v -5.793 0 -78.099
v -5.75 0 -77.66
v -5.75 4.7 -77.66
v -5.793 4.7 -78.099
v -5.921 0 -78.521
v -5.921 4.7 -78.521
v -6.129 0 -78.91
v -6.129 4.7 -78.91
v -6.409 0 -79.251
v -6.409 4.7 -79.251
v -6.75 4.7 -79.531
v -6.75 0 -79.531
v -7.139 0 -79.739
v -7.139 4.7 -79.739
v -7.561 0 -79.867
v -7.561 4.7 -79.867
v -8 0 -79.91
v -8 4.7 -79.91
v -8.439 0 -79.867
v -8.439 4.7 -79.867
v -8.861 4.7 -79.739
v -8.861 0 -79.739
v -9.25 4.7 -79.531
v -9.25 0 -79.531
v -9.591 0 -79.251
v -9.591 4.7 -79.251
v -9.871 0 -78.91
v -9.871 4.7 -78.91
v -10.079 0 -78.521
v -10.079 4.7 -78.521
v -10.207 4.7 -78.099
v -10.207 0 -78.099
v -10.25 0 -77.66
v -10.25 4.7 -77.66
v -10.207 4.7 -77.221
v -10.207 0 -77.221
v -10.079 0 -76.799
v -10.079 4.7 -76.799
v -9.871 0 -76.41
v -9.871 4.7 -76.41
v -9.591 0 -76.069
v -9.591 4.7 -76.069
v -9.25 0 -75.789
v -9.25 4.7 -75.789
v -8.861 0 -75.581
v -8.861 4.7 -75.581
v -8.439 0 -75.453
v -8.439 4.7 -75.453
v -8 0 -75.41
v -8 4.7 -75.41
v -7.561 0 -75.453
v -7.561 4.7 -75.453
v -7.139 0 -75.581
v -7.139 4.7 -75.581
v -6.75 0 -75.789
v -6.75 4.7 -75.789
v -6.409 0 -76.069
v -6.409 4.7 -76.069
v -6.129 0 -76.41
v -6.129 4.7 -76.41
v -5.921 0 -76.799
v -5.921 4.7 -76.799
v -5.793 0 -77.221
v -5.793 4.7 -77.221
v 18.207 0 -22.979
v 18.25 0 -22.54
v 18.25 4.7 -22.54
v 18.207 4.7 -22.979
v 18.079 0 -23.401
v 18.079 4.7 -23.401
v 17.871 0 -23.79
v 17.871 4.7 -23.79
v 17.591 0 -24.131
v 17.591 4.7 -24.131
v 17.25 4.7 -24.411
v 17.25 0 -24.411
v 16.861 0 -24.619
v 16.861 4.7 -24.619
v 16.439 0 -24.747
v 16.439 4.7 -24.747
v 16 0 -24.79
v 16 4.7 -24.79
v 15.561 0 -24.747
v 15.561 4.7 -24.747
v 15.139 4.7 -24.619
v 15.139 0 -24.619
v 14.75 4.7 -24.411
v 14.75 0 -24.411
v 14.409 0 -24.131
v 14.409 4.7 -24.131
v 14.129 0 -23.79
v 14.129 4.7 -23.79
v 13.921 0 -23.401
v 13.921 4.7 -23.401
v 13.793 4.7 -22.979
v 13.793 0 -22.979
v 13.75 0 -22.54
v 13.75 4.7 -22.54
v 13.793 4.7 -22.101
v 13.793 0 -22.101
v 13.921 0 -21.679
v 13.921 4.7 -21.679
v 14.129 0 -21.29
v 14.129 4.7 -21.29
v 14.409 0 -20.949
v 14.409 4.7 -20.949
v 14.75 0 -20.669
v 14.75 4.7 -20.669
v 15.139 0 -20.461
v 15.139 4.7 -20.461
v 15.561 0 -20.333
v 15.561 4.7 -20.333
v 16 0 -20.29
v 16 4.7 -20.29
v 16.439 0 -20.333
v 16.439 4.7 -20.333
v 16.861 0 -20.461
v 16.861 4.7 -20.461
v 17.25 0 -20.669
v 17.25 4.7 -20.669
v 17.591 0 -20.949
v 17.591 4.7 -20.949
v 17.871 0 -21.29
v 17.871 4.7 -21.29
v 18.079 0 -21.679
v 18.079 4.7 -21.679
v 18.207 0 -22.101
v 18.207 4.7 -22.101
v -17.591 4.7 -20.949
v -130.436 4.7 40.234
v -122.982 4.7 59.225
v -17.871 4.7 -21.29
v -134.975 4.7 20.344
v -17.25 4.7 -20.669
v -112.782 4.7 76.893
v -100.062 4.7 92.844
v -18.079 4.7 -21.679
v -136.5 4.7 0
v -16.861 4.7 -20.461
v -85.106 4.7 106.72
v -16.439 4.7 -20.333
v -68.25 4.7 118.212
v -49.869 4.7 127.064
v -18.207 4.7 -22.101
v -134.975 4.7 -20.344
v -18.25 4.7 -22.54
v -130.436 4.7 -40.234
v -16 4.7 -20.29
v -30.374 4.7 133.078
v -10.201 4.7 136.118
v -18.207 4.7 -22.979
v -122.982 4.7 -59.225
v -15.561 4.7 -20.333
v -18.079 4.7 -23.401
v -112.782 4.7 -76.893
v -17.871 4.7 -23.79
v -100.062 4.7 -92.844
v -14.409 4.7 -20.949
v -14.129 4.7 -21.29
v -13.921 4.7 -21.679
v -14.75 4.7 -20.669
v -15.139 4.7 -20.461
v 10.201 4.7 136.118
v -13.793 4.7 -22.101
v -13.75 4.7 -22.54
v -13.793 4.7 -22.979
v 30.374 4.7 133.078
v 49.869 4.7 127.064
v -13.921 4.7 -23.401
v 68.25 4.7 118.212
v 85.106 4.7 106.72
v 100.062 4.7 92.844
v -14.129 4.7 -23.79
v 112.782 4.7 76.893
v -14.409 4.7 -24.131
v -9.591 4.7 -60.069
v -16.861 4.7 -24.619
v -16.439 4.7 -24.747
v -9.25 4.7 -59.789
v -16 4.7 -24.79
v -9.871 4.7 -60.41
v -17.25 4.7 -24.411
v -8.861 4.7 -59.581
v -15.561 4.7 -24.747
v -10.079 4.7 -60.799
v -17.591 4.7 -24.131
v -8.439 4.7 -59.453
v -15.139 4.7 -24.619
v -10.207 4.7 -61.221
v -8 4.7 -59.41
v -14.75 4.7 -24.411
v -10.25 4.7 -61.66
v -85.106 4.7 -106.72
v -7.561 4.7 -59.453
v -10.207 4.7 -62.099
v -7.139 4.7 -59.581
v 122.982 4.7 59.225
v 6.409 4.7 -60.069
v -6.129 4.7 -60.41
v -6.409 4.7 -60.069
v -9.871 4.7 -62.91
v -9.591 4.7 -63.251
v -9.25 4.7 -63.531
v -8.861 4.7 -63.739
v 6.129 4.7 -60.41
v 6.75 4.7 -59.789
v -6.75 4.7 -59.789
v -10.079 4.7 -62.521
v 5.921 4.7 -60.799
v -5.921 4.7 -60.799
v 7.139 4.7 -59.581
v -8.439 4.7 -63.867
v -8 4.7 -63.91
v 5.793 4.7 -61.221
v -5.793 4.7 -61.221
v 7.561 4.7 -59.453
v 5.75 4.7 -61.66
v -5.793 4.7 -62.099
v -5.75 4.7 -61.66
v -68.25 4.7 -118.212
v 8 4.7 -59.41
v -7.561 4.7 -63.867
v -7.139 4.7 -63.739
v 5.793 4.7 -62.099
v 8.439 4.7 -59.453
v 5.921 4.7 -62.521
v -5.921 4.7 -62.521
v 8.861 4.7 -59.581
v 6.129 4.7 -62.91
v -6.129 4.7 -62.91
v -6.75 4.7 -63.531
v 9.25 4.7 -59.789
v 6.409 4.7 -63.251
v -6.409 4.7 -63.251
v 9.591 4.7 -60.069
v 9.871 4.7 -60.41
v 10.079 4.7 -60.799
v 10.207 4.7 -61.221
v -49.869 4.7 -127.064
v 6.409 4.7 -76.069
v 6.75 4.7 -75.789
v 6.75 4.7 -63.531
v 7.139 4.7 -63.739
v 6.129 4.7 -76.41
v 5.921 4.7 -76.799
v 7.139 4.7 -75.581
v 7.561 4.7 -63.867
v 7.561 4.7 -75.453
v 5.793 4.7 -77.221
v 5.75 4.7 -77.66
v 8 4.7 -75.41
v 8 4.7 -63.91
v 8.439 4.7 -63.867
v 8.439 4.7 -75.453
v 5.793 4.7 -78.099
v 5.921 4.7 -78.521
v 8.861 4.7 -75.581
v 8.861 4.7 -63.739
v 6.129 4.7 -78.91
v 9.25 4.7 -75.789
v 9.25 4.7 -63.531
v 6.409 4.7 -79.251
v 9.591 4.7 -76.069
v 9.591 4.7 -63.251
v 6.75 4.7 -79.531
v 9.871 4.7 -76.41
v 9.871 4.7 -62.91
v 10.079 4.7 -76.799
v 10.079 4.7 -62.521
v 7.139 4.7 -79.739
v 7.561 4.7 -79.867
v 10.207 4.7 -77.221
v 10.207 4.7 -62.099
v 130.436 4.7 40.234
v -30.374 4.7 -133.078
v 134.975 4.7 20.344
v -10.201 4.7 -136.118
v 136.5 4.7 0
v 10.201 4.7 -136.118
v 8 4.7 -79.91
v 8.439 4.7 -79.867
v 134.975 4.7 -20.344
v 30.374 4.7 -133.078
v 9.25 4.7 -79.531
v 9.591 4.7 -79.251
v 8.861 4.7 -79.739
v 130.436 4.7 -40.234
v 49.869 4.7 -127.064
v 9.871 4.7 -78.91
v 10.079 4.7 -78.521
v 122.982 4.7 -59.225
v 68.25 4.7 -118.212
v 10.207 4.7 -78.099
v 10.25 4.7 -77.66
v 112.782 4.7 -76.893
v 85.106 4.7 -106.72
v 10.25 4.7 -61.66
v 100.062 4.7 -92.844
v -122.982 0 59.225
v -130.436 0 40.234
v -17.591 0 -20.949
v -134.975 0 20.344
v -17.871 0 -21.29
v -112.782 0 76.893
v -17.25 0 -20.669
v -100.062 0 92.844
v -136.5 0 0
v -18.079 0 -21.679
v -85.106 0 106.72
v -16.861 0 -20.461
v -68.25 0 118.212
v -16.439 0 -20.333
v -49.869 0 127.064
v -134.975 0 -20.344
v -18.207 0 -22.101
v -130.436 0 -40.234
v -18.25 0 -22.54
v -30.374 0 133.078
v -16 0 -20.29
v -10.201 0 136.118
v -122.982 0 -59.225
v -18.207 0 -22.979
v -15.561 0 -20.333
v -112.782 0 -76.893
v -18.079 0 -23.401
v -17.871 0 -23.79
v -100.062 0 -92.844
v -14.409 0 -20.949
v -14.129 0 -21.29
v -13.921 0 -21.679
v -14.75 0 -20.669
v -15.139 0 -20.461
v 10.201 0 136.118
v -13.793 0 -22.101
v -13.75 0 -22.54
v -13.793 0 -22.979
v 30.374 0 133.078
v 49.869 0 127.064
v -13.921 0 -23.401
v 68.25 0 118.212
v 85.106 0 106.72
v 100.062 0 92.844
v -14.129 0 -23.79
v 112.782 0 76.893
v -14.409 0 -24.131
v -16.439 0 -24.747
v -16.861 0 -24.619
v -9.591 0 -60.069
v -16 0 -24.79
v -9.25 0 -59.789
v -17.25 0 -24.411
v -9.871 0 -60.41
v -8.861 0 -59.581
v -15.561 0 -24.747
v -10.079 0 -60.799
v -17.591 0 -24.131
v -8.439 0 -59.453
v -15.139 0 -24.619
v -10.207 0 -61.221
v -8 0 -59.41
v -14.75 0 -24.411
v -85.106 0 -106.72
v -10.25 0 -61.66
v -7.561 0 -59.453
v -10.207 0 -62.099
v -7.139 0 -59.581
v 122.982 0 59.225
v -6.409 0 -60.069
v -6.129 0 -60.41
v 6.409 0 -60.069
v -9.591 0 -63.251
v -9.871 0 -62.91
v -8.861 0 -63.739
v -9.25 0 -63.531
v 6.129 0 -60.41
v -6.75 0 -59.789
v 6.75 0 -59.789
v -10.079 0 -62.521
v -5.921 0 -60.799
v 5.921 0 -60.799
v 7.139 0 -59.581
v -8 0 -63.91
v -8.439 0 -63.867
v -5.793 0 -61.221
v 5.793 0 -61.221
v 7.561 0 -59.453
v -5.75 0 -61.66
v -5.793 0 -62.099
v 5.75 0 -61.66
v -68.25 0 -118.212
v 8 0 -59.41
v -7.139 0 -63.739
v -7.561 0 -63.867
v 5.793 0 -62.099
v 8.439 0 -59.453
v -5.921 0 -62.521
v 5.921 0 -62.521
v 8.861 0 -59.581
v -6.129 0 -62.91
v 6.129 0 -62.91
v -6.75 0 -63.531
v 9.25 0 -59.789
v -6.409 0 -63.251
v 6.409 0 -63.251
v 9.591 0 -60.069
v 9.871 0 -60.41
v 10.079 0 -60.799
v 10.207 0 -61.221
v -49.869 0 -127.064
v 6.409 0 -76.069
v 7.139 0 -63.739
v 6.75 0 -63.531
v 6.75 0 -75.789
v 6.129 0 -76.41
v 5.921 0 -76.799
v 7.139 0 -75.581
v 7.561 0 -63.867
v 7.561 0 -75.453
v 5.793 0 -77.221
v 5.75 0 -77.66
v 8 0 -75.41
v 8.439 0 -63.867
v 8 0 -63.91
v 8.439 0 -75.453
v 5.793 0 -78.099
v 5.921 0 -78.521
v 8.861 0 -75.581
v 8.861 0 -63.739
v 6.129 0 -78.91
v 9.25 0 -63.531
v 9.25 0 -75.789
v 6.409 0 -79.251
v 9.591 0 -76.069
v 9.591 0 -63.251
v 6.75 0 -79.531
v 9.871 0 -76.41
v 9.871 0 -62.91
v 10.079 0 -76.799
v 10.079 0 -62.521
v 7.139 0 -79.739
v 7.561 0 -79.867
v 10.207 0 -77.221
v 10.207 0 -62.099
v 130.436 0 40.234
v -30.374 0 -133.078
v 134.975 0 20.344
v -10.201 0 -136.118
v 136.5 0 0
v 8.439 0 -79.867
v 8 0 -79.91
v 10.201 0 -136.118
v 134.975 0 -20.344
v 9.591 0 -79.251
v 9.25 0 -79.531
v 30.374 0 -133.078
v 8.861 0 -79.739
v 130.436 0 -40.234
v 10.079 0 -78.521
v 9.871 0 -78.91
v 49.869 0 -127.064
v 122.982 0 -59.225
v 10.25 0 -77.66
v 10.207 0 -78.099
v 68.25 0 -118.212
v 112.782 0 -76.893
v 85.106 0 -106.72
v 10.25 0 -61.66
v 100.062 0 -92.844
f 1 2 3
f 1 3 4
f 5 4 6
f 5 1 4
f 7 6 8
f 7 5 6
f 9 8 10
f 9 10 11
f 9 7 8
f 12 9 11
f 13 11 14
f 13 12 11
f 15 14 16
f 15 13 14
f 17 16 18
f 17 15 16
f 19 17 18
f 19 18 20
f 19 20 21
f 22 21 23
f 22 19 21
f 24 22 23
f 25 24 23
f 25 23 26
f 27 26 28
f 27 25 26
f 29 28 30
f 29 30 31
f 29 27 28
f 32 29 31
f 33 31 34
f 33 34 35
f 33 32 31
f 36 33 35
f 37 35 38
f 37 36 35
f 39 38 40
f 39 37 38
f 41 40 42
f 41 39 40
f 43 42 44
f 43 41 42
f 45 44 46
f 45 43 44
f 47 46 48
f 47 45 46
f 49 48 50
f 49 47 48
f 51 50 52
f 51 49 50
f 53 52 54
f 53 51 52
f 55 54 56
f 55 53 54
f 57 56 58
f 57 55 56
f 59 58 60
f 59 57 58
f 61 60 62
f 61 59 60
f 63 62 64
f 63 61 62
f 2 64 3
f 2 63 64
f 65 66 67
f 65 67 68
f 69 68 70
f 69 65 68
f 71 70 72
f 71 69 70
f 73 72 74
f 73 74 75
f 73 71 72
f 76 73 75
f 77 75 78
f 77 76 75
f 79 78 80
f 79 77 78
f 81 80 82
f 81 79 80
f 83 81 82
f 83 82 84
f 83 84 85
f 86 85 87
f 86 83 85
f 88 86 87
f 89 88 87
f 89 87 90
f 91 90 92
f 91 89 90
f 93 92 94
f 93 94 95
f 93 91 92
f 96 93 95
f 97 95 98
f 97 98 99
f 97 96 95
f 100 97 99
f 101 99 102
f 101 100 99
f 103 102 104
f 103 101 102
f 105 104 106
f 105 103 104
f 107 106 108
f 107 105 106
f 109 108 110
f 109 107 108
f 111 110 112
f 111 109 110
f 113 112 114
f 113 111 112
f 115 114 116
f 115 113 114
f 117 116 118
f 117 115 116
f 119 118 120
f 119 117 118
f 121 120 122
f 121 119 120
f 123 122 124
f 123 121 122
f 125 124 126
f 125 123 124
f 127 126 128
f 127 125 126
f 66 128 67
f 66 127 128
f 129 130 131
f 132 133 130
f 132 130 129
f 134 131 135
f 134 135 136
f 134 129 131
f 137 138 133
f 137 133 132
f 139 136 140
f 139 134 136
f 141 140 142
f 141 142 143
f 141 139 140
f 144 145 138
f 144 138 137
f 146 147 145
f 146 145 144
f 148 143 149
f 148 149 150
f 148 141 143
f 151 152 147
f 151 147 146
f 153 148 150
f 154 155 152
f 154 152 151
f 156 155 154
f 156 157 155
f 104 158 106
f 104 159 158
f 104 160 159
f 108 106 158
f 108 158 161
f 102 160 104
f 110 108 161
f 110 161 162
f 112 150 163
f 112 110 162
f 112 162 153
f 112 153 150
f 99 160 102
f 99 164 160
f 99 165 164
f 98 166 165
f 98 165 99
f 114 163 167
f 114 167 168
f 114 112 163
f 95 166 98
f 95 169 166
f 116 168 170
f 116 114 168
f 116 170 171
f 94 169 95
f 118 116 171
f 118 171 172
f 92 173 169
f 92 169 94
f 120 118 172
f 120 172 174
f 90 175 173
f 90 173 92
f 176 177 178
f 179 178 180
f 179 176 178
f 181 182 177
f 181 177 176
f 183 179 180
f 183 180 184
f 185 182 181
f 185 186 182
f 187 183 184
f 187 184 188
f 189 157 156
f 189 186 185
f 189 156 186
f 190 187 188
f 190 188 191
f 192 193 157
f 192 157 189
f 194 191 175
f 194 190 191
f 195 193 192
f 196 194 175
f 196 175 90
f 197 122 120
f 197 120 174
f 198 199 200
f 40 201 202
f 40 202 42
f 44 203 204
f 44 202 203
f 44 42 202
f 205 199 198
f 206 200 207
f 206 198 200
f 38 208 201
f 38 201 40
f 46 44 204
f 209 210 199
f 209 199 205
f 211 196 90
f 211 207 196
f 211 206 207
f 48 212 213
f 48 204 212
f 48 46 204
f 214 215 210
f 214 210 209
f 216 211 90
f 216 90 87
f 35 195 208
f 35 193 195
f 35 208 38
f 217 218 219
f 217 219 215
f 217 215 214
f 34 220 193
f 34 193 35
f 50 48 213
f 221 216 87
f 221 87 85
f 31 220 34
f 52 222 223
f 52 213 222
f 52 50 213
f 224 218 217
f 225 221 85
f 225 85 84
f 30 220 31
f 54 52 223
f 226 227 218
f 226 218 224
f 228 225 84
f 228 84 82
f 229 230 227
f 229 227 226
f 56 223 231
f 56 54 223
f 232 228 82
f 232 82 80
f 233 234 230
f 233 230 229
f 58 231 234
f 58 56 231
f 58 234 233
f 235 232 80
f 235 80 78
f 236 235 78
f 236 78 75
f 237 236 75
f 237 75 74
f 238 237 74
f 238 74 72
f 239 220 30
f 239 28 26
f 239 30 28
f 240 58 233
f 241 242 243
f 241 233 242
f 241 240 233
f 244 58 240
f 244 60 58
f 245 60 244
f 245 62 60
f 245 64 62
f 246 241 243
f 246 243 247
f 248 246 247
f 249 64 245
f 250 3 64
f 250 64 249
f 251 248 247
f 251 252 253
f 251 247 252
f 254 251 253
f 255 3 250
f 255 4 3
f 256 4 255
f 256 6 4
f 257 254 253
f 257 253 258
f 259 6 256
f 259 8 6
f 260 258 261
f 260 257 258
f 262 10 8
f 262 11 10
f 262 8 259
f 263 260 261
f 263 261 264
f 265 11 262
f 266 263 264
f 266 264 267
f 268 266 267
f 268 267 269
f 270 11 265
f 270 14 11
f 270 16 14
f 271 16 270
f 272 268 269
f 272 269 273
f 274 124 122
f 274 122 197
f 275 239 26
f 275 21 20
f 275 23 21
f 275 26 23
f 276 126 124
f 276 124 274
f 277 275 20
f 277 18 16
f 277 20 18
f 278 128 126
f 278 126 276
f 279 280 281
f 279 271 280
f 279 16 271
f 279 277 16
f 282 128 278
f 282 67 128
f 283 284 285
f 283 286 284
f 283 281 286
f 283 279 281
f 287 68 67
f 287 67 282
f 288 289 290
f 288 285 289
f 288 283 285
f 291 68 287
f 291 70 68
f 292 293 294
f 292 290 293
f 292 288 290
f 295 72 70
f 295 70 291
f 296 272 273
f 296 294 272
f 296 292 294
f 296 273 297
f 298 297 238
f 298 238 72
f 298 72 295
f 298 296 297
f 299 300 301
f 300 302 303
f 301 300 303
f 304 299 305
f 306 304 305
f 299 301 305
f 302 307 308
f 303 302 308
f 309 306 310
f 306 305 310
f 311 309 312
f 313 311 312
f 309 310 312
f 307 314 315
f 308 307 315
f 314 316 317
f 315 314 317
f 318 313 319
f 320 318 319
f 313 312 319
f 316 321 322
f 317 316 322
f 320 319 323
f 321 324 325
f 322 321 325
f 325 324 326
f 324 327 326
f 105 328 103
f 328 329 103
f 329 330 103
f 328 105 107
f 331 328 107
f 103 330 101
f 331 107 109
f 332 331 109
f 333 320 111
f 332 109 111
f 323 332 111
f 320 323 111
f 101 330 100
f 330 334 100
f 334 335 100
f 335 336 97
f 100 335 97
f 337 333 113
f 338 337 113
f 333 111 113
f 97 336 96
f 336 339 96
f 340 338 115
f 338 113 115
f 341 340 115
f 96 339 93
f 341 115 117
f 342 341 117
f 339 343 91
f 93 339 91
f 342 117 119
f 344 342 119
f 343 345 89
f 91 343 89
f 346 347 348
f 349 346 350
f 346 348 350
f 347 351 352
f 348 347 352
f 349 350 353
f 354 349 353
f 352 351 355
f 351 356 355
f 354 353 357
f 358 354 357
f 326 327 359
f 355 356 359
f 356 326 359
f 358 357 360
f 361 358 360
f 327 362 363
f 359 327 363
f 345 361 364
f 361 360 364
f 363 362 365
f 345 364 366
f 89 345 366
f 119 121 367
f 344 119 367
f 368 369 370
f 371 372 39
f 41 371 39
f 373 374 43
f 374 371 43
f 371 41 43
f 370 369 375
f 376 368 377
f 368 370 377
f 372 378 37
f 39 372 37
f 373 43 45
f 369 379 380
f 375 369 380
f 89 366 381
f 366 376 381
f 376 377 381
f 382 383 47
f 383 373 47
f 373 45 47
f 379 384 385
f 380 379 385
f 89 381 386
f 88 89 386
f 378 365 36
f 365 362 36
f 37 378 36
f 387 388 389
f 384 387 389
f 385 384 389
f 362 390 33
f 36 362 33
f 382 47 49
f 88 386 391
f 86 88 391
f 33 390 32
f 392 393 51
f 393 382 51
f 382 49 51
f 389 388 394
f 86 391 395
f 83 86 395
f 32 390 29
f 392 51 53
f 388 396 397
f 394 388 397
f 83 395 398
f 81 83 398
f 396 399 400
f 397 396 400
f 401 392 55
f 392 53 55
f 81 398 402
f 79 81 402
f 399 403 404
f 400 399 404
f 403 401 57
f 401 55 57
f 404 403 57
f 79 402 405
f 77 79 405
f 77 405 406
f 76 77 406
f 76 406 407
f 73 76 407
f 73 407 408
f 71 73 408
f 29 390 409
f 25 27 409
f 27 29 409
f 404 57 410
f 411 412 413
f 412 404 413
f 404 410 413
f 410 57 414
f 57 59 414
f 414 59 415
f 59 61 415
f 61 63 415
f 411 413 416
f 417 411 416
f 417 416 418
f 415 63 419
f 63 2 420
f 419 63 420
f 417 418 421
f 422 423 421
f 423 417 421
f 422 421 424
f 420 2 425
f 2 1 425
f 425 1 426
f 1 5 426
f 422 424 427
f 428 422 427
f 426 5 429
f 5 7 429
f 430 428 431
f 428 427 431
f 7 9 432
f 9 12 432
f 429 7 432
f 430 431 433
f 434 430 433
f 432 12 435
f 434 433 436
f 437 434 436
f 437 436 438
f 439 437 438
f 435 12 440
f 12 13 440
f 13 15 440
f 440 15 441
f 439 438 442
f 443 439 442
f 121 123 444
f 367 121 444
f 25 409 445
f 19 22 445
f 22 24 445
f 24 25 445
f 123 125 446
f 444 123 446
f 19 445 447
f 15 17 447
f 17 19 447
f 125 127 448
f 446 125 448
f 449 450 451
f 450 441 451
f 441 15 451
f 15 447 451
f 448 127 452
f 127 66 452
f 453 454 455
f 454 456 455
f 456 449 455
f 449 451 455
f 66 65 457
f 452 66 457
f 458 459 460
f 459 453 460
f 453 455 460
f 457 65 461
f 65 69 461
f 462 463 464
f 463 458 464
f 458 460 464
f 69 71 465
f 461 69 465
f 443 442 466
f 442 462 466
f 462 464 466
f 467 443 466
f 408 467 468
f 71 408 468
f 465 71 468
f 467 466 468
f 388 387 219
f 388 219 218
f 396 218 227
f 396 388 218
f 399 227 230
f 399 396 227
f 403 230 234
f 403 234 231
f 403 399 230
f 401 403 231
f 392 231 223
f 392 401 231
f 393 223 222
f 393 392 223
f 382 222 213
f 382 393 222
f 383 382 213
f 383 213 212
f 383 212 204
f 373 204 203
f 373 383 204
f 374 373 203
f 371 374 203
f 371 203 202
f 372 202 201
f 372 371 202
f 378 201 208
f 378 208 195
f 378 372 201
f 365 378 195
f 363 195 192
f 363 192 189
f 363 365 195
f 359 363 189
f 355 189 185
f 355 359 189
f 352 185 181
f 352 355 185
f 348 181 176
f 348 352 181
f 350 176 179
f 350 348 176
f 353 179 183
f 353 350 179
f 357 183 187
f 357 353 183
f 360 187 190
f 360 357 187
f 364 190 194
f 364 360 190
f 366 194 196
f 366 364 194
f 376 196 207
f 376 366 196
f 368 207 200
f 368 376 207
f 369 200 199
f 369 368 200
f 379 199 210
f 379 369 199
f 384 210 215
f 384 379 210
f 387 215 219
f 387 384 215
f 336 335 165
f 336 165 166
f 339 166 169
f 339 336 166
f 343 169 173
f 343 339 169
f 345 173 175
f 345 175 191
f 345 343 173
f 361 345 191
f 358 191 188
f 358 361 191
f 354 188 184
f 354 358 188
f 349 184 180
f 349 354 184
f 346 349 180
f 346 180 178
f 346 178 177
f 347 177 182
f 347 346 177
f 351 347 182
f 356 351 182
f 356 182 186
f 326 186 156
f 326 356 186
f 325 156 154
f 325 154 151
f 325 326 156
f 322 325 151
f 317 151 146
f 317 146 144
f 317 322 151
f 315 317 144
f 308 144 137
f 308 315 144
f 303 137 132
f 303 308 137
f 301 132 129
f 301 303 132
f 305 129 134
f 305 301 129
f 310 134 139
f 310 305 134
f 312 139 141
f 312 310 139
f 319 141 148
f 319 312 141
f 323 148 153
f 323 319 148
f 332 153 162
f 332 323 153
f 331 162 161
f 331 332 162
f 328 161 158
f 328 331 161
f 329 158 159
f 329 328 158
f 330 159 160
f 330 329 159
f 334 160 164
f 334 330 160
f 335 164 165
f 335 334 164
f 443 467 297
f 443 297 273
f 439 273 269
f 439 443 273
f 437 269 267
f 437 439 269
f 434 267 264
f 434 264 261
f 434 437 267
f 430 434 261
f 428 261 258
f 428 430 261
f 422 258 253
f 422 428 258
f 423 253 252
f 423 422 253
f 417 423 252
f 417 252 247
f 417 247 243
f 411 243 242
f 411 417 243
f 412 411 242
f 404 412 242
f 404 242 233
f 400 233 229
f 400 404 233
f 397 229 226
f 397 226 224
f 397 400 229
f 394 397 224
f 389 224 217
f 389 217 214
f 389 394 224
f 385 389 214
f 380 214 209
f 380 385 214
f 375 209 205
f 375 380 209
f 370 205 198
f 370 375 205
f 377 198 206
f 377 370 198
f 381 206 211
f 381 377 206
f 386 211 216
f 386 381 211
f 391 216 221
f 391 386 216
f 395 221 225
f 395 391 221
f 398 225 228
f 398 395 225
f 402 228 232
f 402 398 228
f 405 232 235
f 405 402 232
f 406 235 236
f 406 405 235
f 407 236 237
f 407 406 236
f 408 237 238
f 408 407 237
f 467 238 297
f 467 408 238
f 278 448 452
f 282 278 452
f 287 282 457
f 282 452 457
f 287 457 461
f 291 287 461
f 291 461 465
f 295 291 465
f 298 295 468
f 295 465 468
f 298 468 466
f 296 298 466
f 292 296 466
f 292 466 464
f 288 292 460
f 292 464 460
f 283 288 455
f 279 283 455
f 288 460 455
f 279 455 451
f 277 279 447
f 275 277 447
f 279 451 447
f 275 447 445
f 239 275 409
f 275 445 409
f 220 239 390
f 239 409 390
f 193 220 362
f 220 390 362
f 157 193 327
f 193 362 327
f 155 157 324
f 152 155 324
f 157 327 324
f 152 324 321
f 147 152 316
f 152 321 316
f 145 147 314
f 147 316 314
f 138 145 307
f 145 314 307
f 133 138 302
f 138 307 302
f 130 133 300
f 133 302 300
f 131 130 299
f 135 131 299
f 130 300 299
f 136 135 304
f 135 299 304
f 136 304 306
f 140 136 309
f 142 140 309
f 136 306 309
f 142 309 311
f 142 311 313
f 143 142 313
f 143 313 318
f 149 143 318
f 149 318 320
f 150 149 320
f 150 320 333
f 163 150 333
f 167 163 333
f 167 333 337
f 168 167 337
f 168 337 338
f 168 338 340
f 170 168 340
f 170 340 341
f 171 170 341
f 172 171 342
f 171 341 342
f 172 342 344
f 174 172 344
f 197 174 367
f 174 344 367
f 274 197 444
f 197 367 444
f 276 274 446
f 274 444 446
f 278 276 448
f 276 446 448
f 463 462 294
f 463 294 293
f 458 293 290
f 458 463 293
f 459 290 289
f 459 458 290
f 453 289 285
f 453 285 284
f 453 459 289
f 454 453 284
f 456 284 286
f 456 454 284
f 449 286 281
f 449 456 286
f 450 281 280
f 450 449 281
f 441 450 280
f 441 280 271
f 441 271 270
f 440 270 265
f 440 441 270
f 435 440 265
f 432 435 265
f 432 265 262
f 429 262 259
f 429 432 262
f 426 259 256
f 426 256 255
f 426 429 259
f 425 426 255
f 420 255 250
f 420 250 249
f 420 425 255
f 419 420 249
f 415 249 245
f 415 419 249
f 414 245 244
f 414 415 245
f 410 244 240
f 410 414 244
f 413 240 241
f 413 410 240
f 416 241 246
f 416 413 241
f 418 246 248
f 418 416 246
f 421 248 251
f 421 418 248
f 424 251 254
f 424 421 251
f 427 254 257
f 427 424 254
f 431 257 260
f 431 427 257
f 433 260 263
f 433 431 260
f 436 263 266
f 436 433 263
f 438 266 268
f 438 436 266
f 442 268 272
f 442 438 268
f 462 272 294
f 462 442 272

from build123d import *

# Parameters (mm, degrees)
SKETCH1_R           = 136.5
SKETCH1_R_2         = 2.25
BOSS_EXTRUDE1_DEPTH = 4.7


with BuildPart() as part:
    # Sketch1 → Boss-Extrude1 (new body)
    with BuildSketch(Plane(origin=(0, 0, 0), x_dir=(1, 0, 0), z_dir=(0, 1, 0))):
        Circle(SKETCH1_R)
        with Locations((-8, 77.66)):
            Circle(SKETCH1_R_2, mode=Mode.SUBTRACT)
        with Locations((8, 77.66)):
            Circle(SKETCH1_R_2, mode=Mode.SUBTRACT)
        with Locations((8, 61.66)):
            Circle(SKETCH1_R_2, mode=Mode.SUBTRACT)
        with Locations((-8, 61.66)):
            Circle(SKETCH1_R_2, mode=Mode.SUBTRACT)
        with Locations((-16, 22.54)):
            Circle(SKETCH1_R_2, mode=Mode.SUBTRACT)
        with Locations((16, 22.54)):
            Circle(SKETCH1_R_2, mode=Mode.SUBTRACT)
    extrude(amount=BOSS_EXTRUDE1_DEPTH)


solid = part.part
